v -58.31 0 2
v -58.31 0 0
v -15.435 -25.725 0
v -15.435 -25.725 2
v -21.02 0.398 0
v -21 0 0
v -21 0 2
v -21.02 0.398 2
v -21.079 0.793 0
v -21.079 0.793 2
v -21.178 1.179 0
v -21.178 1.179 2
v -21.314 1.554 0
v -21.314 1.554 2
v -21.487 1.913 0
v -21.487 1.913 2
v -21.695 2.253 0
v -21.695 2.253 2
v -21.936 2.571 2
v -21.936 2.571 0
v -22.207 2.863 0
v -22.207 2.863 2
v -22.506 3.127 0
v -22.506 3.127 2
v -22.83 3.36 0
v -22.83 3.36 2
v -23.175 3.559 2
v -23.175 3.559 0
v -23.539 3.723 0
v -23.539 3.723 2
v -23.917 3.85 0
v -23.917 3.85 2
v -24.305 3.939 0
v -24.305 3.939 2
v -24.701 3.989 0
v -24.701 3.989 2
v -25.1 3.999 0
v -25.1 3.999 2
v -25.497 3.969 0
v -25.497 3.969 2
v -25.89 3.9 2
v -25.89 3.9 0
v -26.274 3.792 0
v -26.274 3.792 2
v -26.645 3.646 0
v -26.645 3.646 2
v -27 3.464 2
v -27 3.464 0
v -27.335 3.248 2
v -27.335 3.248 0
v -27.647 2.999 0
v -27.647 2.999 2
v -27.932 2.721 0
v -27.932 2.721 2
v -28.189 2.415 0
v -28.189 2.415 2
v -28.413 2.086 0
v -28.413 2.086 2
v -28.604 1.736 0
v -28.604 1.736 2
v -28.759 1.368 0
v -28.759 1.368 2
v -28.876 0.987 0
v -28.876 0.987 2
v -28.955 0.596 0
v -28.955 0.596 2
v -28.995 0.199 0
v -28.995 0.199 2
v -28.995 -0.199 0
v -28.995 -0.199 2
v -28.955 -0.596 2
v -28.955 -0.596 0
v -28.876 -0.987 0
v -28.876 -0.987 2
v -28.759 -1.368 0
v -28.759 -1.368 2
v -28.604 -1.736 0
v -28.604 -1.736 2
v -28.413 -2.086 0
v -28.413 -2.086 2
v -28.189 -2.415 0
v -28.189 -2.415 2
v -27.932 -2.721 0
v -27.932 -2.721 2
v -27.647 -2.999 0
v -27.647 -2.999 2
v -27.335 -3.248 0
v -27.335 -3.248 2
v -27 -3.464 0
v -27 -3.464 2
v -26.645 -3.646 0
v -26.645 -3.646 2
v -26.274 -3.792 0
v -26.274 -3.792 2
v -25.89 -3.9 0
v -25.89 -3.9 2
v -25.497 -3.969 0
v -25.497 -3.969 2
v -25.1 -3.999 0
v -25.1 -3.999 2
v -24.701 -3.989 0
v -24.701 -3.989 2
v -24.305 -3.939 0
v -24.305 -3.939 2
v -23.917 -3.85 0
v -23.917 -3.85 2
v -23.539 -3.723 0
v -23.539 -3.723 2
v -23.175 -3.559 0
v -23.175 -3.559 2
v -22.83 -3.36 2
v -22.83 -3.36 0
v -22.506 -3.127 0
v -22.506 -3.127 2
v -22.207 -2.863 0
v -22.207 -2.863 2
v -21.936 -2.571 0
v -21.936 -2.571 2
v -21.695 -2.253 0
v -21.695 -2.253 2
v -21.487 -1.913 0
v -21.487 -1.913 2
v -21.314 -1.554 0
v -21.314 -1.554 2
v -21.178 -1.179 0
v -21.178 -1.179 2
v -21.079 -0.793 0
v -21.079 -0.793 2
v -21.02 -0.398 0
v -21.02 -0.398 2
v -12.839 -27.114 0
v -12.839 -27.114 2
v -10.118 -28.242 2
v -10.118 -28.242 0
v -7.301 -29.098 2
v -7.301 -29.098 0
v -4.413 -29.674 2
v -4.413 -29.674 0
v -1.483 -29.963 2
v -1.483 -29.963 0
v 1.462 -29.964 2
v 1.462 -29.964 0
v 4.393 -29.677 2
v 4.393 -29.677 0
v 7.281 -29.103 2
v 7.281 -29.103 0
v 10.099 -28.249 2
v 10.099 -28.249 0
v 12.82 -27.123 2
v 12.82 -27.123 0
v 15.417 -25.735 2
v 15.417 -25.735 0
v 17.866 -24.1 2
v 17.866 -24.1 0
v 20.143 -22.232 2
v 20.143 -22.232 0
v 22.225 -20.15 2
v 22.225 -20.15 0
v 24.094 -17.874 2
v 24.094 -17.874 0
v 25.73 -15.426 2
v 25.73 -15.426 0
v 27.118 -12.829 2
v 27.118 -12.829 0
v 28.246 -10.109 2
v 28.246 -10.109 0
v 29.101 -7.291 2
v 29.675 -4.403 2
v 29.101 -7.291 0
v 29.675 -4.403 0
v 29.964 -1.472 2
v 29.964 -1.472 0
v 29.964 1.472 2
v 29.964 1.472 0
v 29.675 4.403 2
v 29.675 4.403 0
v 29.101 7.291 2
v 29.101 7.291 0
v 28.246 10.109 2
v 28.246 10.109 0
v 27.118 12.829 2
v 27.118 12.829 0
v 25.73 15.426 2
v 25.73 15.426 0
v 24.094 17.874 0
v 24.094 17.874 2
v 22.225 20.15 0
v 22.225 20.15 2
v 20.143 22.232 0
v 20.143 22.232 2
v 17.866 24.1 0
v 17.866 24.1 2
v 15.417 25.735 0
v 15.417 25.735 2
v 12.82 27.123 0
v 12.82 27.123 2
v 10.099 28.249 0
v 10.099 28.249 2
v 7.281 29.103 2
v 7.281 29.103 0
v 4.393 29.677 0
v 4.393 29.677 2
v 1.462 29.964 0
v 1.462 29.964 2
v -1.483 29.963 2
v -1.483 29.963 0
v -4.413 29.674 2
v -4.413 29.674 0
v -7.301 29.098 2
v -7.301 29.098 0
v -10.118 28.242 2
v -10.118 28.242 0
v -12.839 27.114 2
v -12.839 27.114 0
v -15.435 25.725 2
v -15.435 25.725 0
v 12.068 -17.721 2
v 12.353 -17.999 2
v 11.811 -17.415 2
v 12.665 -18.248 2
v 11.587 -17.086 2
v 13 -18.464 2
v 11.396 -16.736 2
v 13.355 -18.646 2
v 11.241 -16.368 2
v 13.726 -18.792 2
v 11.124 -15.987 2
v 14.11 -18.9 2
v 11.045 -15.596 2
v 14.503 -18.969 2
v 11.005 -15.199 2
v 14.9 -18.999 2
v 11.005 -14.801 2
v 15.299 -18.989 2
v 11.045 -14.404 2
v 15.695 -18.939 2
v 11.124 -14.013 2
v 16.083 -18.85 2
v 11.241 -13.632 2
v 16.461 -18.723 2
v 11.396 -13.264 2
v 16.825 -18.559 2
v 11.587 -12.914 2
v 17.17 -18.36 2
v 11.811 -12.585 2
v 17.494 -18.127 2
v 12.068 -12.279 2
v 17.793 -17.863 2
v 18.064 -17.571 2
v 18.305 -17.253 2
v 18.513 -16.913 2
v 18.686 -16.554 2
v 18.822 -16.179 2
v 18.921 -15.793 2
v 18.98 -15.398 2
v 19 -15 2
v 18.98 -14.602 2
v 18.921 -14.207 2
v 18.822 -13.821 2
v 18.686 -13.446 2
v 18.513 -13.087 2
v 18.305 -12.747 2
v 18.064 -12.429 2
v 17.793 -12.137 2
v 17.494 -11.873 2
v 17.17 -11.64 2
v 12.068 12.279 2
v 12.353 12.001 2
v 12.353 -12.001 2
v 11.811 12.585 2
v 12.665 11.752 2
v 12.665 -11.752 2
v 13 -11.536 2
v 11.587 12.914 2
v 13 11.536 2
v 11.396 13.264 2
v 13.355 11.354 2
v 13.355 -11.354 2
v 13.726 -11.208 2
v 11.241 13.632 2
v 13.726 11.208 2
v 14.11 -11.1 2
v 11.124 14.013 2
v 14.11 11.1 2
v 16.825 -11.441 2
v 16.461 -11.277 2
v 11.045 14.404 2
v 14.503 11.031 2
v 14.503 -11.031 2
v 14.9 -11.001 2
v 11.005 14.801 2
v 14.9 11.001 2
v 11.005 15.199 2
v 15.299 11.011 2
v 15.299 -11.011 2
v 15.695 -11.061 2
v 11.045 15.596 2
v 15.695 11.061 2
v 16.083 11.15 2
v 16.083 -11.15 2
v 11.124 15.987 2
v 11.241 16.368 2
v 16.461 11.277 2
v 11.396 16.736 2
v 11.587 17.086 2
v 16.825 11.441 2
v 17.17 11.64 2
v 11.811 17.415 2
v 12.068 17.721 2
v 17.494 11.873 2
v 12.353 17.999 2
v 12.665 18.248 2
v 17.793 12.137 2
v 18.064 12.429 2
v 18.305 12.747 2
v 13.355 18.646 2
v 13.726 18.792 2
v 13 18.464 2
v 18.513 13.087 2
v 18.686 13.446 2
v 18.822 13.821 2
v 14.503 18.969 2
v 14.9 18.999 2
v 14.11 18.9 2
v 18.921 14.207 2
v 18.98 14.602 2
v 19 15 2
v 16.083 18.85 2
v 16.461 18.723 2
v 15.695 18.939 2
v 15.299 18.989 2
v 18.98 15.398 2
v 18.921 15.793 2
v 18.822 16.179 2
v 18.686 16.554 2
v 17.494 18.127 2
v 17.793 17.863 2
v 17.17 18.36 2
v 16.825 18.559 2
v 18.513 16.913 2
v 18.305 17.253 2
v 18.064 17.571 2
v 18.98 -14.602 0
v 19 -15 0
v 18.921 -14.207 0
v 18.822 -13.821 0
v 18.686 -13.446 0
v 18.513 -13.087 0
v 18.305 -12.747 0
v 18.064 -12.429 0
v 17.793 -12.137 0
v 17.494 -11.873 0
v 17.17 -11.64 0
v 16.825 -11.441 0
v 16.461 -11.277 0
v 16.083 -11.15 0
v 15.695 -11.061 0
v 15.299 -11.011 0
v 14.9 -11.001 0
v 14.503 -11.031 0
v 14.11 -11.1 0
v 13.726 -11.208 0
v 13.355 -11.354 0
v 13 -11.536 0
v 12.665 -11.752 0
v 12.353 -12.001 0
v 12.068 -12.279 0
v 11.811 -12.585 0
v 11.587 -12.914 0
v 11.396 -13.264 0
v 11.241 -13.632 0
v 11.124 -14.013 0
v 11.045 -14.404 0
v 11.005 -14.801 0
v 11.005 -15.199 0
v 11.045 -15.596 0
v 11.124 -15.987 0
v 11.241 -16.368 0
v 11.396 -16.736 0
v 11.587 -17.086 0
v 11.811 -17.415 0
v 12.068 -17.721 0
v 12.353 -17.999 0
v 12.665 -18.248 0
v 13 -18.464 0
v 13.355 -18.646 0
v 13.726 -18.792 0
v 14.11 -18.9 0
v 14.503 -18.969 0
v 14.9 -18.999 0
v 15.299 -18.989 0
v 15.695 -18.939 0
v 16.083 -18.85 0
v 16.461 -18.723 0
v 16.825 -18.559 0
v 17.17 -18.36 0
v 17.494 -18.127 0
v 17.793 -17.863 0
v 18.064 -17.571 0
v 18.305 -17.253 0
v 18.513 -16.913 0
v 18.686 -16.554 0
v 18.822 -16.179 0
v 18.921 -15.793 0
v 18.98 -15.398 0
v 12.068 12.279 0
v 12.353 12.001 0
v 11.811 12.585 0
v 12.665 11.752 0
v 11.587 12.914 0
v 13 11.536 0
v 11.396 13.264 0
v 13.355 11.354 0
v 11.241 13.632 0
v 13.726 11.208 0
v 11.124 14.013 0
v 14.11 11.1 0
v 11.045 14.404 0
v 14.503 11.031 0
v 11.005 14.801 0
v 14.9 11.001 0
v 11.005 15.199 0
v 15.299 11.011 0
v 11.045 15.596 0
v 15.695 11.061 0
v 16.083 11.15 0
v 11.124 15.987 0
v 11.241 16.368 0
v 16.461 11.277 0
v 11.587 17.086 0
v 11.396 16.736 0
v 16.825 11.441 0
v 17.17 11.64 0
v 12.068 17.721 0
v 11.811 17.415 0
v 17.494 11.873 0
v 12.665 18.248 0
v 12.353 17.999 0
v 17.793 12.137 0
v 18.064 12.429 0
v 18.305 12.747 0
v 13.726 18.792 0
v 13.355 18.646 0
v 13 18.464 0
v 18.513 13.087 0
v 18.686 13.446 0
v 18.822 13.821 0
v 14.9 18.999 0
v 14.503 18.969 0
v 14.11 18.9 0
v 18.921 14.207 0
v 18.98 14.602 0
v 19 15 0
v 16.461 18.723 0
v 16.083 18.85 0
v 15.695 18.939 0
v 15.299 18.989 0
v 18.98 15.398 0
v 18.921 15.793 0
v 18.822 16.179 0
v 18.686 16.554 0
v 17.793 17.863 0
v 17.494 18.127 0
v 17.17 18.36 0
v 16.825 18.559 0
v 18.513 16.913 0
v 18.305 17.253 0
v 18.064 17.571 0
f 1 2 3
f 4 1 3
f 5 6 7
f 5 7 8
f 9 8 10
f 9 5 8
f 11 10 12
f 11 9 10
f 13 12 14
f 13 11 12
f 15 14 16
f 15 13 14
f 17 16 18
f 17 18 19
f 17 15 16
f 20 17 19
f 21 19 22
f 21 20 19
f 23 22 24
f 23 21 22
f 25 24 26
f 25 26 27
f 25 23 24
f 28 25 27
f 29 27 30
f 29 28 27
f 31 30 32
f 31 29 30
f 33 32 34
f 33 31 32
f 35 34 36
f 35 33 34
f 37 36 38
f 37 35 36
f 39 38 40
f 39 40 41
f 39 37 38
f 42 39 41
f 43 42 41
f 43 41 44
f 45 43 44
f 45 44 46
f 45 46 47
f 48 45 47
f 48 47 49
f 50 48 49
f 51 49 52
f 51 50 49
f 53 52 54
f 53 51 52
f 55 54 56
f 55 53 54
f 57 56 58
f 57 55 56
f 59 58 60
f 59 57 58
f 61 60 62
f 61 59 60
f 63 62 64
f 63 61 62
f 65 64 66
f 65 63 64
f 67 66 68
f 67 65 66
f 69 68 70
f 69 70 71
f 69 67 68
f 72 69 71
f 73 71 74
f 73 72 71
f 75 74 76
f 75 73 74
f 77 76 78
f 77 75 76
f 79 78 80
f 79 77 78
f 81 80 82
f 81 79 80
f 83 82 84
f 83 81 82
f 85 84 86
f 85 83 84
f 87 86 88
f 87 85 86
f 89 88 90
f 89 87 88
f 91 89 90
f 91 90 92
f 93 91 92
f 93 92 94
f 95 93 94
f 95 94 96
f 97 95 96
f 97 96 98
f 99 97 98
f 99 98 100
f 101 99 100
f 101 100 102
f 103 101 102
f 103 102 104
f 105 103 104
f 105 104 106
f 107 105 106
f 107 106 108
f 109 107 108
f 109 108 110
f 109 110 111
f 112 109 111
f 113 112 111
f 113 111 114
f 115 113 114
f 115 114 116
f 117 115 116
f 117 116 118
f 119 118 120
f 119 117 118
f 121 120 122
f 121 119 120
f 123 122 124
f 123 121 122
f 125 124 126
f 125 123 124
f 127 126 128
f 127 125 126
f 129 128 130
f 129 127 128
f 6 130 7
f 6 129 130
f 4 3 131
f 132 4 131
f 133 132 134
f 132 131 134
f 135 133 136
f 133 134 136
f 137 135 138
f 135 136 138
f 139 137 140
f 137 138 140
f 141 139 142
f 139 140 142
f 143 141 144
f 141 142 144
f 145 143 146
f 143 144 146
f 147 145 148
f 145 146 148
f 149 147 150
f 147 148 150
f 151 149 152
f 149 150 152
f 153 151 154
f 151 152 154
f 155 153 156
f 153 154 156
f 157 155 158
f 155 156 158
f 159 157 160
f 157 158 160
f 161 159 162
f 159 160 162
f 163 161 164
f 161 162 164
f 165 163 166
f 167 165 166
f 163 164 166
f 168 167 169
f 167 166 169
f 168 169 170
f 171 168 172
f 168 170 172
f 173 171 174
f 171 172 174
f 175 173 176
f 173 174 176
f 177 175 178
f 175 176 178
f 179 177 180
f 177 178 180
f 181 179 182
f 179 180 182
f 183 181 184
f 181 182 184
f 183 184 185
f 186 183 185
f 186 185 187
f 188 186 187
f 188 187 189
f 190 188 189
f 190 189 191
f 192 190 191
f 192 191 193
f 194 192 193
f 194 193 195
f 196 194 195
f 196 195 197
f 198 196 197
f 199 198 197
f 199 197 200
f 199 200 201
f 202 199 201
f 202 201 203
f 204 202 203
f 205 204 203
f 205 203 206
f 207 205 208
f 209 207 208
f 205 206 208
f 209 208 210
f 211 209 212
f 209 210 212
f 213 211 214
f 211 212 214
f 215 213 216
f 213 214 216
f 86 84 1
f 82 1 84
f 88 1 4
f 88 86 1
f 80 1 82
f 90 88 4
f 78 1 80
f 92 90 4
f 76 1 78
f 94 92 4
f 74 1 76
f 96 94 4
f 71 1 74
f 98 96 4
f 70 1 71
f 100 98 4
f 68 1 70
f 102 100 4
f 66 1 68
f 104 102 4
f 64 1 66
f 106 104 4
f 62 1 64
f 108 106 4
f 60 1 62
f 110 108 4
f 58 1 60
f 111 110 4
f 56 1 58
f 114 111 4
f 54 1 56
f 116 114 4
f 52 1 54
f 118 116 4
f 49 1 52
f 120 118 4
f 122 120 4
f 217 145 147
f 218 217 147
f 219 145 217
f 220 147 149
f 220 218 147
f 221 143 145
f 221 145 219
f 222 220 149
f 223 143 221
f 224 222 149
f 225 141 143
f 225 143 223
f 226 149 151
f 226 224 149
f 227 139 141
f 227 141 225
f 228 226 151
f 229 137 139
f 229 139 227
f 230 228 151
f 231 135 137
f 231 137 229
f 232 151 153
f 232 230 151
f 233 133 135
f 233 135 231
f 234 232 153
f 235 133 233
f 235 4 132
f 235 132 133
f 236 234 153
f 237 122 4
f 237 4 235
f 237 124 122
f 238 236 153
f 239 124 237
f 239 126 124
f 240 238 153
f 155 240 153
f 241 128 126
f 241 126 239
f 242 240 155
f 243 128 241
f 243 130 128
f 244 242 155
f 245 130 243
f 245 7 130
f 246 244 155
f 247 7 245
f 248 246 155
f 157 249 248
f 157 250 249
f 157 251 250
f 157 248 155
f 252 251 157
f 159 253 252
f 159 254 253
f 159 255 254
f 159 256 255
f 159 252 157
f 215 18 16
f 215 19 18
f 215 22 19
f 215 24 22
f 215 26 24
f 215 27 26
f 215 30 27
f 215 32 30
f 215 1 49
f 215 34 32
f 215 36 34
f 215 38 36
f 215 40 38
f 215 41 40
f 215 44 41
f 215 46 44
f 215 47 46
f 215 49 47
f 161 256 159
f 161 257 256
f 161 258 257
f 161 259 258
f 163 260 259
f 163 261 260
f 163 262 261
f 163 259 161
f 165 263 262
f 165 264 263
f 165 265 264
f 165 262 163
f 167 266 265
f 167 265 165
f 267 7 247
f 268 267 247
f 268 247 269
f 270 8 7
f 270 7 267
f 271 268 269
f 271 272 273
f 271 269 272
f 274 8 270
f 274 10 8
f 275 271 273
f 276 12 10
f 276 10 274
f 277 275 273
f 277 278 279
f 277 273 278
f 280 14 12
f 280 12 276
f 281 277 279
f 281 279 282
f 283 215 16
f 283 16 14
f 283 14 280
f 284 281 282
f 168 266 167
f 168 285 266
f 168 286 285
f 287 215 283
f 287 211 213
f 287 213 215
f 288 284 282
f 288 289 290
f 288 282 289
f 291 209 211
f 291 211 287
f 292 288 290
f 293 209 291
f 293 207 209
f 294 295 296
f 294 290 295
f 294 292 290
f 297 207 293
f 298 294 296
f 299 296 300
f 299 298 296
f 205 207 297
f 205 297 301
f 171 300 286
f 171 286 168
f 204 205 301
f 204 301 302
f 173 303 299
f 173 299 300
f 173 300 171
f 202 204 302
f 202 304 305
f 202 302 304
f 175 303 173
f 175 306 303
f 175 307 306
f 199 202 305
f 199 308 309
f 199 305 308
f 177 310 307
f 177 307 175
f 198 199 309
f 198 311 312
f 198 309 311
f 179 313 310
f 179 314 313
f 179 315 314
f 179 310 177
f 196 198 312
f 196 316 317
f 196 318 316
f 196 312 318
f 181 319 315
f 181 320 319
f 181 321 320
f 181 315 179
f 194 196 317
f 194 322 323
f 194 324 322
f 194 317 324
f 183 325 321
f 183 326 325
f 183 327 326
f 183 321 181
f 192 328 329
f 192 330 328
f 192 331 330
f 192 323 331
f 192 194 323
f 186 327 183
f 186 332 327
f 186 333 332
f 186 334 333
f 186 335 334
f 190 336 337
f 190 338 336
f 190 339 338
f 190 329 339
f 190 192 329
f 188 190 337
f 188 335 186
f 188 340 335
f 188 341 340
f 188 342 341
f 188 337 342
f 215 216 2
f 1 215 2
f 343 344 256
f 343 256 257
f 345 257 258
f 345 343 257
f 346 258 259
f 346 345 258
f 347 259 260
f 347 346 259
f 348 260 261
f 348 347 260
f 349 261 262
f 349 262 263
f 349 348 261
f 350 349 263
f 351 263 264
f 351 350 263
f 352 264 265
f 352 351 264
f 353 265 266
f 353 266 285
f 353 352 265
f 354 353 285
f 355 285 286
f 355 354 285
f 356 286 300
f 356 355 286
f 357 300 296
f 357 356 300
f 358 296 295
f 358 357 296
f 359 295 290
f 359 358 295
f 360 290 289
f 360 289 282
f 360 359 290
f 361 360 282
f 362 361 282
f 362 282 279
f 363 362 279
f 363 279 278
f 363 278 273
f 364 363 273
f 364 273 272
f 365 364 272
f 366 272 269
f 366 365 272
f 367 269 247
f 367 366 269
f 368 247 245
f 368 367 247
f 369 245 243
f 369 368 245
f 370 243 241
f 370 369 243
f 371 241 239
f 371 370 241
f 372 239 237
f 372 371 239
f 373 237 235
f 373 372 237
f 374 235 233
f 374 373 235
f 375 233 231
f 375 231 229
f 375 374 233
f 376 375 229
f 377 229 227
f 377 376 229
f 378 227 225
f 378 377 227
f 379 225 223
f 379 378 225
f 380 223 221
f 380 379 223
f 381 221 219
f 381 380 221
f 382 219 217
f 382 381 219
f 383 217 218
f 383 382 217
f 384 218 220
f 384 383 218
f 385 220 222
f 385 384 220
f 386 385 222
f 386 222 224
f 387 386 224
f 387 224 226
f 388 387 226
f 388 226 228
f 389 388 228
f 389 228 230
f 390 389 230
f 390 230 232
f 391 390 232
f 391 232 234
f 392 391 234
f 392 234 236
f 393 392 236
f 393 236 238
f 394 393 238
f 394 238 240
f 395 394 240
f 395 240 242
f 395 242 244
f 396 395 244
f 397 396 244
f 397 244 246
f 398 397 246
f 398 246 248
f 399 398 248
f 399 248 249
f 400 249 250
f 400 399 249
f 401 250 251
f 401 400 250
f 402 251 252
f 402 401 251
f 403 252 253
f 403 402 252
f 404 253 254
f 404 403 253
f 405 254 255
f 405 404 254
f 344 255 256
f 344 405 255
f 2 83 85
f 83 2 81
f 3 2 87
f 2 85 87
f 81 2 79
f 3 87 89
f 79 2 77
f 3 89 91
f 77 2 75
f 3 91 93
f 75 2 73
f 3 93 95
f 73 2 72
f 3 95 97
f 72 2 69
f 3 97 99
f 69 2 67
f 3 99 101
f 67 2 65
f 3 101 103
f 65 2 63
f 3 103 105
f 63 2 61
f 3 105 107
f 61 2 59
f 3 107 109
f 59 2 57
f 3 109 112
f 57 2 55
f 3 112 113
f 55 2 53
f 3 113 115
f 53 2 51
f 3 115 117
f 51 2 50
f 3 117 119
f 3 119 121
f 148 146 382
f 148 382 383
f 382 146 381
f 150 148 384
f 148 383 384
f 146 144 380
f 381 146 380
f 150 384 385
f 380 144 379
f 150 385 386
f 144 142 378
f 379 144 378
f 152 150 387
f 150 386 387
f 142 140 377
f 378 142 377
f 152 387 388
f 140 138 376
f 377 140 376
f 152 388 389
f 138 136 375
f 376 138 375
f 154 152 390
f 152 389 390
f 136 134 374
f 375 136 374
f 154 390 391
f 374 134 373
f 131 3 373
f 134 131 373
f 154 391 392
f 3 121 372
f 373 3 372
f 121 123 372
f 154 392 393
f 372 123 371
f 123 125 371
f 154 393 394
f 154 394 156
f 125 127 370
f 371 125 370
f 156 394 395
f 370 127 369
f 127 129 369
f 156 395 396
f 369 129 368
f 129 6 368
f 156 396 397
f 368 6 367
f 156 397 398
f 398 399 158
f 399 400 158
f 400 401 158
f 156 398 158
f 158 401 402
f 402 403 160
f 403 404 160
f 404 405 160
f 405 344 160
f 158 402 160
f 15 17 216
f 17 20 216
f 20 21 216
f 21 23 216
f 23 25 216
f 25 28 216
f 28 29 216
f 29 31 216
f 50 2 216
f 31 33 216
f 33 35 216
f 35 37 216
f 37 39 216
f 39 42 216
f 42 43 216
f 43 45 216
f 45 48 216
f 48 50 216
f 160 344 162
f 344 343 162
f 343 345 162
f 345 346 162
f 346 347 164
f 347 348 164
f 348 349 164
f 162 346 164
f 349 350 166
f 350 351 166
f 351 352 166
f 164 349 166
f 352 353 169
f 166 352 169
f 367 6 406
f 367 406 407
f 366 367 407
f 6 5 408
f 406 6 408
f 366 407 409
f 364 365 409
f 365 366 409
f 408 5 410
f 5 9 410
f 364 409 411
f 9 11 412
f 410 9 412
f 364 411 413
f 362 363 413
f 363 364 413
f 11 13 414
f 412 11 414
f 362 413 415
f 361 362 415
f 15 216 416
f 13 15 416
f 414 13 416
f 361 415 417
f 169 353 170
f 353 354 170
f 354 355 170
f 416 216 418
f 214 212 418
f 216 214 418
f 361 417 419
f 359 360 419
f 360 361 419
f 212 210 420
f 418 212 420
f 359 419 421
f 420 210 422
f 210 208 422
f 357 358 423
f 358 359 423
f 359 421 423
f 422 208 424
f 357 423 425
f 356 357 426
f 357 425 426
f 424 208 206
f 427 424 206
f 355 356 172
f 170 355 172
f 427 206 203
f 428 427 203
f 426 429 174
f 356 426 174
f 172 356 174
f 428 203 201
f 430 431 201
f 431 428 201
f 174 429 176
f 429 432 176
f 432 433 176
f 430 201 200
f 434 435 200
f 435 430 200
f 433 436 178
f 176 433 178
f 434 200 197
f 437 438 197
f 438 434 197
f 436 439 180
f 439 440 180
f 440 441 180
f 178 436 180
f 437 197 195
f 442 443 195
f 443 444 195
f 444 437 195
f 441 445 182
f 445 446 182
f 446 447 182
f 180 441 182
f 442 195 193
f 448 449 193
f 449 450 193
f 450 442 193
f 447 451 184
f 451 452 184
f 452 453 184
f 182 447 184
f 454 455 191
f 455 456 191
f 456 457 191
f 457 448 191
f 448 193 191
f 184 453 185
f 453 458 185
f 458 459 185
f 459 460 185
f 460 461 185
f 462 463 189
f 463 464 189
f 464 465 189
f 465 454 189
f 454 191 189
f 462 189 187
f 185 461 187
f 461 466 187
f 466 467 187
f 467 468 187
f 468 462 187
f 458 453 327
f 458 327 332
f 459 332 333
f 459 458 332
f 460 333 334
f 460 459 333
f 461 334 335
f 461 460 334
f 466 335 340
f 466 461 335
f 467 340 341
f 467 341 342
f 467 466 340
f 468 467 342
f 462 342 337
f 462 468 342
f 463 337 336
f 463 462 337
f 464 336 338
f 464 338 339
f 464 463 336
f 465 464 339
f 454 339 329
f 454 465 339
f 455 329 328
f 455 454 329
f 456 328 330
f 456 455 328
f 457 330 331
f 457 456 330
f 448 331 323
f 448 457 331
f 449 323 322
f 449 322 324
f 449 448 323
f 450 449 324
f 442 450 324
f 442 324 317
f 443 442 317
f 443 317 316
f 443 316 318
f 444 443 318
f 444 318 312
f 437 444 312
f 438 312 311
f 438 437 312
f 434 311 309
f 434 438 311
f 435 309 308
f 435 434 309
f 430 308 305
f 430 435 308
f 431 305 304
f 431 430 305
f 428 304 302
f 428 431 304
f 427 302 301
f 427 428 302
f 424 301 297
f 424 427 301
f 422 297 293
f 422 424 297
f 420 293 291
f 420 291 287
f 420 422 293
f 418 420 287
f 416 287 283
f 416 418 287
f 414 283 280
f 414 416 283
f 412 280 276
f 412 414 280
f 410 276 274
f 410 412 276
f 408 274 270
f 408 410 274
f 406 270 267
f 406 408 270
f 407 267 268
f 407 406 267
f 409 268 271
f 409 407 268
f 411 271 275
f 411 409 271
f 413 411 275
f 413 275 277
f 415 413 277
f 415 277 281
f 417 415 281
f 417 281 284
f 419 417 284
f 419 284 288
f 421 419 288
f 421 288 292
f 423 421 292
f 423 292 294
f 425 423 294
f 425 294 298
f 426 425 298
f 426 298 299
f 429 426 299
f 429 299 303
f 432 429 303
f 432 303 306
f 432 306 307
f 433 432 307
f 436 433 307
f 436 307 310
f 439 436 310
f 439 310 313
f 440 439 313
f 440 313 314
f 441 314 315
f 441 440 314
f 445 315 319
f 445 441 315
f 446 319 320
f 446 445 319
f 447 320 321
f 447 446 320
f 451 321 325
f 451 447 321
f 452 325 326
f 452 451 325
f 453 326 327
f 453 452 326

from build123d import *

# Parameters (mm, degrees)
F0_R     = 4
F1_DEPTH = 2


with BuildPart() as f1:
    # F0 (on Top) → F1 (new body)
    with BuildSketch(Plane.XY):
        with BuildLine():
            Line((-15.434873, 25.724788), (-58.309519, 0))
            Line((-58.309519, 0), (-15.434873, -25.724788))
            ThreePointArc((-15.434873, -25.724788), (30, 0), (-15.434873, 25.724788))
        make_face()
        with Locations((15, -15)):
            Circle(F0_R, mode=Mode.SUBTRACT)
        with Locations((-25, 0)):
            Circle(F0_R, mode=Mode.SUBTRACT)
        with Locations((15, 15)):
            Circle(F0_R, mode=Mode.SUBTRACT)
    extrude(amount=F1_DEPTH)


solid = f1.part
